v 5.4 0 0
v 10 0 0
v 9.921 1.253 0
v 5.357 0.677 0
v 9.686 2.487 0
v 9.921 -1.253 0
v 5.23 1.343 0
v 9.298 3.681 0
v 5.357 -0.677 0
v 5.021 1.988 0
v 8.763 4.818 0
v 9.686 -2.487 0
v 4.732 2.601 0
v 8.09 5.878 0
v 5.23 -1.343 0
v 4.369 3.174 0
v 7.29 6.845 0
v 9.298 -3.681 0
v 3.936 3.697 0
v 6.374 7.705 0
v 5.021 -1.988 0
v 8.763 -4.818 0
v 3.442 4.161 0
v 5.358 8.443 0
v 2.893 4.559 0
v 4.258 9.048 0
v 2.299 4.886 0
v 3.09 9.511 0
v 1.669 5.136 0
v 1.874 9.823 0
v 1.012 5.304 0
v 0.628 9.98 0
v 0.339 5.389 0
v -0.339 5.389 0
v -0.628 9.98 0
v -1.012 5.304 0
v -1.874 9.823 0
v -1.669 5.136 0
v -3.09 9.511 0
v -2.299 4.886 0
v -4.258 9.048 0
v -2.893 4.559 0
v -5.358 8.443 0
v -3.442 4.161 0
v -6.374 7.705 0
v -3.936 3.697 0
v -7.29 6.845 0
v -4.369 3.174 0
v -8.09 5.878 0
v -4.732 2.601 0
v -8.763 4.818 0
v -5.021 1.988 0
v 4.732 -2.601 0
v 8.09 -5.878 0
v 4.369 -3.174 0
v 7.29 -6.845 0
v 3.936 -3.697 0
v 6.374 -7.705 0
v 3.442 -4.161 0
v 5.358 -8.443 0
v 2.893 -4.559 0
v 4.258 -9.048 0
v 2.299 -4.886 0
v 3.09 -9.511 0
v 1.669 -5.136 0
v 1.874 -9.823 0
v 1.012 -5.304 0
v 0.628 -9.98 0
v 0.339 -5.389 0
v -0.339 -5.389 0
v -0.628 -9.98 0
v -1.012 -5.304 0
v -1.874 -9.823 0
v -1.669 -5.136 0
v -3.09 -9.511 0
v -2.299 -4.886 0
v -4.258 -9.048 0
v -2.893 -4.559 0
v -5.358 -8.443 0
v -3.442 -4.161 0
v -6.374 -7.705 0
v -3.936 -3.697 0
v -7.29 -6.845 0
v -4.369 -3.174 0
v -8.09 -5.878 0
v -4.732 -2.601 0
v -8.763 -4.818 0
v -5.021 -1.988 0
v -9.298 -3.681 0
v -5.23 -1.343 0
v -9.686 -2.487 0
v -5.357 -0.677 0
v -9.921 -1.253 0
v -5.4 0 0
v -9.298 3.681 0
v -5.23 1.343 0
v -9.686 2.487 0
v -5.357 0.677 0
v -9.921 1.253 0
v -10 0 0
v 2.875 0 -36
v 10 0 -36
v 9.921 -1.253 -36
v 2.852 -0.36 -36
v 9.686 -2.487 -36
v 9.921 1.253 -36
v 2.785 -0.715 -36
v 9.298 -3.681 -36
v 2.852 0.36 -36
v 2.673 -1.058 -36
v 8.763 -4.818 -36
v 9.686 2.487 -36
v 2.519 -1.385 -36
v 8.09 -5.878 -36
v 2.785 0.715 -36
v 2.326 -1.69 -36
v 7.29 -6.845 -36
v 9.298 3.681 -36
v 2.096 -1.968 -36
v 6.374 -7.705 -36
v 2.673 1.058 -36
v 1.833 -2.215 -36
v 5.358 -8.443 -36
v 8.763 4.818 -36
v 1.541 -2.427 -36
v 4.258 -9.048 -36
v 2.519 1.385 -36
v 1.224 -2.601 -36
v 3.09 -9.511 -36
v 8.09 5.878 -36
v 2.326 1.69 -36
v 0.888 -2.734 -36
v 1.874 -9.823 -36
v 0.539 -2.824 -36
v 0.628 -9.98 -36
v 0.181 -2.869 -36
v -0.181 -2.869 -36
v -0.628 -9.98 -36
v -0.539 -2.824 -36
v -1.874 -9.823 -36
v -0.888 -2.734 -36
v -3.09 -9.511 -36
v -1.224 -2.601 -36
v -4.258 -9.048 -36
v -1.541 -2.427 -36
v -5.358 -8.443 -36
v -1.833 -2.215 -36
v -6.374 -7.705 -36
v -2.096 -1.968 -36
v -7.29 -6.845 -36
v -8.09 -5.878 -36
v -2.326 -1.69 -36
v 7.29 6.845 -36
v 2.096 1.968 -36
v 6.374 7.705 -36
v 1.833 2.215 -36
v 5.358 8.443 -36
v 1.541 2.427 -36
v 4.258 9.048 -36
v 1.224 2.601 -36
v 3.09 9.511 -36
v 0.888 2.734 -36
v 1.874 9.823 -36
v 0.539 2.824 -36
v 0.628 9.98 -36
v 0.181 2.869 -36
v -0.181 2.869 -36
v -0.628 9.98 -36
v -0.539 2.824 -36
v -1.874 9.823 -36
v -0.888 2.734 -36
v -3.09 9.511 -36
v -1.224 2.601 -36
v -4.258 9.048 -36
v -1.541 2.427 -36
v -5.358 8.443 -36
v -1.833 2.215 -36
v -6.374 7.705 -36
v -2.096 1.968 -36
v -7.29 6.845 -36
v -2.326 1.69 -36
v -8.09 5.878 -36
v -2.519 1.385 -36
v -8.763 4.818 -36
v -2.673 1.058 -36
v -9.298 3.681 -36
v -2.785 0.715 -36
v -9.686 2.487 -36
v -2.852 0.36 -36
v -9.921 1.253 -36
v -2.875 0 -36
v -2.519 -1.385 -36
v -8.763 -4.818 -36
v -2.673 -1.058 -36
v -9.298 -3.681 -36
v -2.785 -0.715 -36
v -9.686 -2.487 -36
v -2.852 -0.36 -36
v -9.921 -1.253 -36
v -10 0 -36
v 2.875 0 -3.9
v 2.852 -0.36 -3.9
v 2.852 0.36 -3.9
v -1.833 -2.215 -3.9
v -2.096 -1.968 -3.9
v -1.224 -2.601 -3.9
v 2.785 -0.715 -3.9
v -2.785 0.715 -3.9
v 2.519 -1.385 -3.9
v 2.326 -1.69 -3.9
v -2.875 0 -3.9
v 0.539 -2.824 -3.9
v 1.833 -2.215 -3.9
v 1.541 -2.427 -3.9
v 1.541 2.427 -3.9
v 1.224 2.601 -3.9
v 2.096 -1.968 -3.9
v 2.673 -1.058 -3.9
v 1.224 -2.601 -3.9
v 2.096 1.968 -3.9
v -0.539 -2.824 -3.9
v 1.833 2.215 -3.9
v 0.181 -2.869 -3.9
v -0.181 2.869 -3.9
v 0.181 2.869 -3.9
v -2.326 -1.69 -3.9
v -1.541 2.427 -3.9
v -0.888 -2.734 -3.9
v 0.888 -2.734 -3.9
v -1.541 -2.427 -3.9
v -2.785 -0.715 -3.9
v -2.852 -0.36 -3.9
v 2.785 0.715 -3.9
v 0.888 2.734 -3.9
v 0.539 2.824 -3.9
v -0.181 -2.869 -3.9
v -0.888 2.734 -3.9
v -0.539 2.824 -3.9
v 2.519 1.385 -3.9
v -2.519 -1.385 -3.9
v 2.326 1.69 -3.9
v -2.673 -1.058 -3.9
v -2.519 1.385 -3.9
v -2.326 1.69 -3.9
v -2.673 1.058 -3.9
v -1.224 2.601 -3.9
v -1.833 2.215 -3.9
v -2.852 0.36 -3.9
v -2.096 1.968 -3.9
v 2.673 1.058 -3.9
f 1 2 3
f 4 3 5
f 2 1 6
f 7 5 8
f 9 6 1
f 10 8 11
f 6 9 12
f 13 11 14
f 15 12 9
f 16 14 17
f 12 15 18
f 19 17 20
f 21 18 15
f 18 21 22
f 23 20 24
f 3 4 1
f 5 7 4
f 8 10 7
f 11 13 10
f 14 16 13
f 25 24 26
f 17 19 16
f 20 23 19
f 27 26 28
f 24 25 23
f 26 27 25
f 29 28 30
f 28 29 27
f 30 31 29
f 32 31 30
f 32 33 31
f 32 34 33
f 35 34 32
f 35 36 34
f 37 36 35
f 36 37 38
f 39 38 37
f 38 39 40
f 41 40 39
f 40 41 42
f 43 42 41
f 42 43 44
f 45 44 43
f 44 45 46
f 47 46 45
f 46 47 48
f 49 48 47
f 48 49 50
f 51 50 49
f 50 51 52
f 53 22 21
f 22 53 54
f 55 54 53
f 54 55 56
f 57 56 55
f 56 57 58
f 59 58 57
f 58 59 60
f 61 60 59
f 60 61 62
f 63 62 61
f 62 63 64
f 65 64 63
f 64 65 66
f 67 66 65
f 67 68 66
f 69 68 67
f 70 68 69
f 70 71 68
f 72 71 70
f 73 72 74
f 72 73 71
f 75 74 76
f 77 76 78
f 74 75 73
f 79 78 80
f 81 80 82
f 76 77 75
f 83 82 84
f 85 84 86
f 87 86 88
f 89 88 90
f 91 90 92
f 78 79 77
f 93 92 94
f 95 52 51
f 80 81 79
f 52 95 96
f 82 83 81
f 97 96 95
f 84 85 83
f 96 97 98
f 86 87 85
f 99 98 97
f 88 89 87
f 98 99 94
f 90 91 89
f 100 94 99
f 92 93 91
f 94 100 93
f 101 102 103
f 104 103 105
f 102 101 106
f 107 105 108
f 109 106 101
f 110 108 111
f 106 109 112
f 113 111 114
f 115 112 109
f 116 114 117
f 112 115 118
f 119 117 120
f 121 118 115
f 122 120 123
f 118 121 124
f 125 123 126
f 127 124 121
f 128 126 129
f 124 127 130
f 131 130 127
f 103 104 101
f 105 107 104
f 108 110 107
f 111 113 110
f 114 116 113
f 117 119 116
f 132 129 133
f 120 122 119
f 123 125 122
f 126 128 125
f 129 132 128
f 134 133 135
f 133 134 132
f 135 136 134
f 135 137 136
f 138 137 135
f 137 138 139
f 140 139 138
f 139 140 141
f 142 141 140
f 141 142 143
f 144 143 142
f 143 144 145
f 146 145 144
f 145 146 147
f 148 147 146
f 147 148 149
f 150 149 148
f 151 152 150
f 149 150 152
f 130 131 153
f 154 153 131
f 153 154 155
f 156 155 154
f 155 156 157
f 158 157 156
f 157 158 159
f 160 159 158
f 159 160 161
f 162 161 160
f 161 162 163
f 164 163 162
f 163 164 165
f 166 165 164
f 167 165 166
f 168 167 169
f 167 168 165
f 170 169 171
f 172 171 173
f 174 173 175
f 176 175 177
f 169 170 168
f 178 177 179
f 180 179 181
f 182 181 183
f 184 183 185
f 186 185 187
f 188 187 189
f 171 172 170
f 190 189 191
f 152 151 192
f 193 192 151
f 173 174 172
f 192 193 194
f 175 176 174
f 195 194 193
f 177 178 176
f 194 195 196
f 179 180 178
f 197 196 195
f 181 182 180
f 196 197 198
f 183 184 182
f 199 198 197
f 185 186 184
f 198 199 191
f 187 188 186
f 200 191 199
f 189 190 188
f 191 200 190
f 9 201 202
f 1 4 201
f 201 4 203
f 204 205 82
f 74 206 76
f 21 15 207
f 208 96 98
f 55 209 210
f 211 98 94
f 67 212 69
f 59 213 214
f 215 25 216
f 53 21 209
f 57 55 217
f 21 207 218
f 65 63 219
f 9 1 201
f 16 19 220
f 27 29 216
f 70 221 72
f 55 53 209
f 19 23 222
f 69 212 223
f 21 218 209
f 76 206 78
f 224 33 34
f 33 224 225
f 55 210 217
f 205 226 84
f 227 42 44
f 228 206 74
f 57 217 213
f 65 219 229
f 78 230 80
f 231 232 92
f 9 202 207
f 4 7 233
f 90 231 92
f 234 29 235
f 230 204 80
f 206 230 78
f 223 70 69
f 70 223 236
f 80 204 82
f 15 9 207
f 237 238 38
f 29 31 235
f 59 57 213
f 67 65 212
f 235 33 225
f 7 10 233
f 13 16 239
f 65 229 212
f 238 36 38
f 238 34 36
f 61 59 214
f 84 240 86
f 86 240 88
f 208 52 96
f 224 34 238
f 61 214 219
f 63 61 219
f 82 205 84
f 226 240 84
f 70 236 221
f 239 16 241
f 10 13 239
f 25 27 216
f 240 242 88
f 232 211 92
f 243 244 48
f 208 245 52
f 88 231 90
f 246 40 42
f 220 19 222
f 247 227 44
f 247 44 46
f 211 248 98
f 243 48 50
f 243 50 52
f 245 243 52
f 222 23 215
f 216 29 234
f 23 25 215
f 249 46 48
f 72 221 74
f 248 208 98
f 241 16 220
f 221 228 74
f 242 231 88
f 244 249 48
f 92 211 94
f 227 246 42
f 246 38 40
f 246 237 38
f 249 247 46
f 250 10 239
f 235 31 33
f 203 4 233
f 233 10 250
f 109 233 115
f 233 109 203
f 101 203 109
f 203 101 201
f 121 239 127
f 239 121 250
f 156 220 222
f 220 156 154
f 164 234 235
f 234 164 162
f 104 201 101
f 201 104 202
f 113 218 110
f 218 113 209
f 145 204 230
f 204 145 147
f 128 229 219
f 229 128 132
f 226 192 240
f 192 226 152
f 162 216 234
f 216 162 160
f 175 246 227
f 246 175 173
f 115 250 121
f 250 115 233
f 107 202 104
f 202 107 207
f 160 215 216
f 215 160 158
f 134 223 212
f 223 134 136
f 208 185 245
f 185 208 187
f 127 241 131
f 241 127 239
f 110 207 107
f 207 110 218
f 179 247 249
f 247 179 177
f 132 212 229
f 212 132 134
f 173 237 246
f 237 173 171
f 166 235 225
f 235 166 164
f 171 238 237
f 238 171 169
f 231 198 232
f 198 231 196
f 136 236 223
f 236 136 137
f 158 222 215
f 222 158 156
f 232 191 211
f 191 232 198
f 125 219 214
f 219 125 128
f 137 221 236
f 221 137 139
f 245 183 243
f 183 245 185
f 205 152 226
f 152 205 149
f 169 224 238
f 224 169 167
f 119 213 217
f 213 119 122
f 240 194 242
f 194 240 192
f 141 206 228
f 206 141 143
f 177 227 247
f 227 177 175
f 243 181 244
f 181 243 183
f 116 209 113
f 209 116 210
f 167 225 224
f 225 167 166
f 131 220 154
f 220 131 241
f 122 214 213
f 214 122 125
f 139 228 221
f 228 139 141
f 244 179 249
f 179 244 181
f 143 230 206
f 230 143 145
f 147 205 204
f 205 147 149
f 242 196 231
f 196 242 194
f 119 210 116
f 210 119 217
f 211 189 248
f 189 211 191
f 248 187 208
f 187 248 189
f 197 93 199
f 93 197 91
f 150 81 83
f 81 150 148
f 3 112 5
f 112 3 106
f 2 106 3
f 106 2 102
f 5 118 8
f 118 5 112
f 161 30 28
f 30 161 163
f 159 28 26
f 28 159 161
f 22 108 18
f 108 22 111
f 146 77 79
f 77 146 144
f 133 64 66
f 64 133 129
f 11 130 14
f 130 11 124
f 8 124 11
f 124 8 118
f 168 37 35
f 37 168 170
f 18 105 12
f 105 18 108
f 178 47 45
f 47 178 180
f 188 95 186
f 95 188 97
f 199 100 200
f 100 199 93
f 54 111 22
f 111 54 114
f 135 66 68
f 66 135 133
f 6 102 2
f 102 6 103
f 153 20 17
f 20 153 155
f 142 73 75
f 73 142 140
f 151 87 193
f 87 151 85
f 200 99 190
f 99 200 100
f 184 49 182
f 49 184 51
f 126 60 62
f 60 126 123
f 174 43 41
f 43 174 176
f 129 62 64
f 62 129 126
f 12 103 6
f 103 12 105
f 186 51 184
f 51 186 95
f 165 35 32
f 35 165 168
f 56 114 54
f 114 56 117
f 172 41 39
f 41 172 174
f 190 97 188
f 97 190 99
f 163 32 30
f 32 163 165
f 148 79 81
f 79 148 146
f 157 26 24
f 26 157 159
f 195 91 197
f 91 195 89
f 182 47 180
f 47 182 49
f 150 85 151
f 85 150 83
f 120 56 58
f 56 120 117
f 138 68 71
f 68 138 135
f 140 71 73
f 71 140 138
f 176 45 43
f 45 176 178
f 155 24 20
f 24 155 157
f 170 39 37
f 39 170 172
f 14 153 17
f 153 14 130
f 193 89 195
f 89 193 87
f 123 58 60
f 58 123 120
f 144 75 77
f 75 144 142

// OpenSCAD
$fn = 50;


difference() {
	union() {
		translate(v = [0, 0, -36.0000000000]) {
			cylinder(h = 36, r = 10.0000000000);
		}
		cylinder(h = 0, r = 13.0000000000);
	}
	union() {
		translate(v = [0, 0, 0]) {
			rotate(a = [0, 0, 0]) {
				difference() {
					union() {
						#translate(v = [0, 0, -36.0000000000]) {
							cylinder(h = 36, r = 2.6000000000);
						}
						#translate(v = [0, 0, -3.9000000000]) {
							cylinder(h = 3.9000000000, r1 = 2.8750000000, r2 = 5.4000000000);
						}
						#translate(v = [0, 0, -36.0000000000]) {
							cylinder(h = 36, r = 2.8750000000);
						}
						#translate(v = [0, 0, -36.0000000000]) {
							cylinder(h = 36, r = 2.6000000000);
						}
					}
					union();
				}
			}
		}
	}
}
